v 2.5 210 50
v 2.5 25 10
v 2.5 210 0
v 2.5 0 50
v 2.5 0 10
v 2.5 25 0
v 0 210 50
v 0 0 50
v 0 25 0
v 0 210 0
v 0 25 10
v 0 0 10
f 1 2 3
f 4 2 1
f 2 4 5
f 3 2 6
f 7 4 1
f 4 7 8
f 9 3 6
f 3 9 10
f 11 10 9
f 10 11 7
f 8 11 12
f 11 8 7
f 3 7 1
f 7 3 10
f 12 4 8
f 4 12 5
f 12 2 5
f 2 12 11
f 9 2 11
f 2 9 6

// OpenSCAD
//Blind size
blindLength = 2.5;
blindWidth = 210;
blindHeight = 50;

//notchSize
notchWidth = 25;
notchHeight = 10;

difference(){
    cube([blindLength, blindWidth, blindHeight]);
    cube([blindLength, notchWidth, notchHeight]);
}
